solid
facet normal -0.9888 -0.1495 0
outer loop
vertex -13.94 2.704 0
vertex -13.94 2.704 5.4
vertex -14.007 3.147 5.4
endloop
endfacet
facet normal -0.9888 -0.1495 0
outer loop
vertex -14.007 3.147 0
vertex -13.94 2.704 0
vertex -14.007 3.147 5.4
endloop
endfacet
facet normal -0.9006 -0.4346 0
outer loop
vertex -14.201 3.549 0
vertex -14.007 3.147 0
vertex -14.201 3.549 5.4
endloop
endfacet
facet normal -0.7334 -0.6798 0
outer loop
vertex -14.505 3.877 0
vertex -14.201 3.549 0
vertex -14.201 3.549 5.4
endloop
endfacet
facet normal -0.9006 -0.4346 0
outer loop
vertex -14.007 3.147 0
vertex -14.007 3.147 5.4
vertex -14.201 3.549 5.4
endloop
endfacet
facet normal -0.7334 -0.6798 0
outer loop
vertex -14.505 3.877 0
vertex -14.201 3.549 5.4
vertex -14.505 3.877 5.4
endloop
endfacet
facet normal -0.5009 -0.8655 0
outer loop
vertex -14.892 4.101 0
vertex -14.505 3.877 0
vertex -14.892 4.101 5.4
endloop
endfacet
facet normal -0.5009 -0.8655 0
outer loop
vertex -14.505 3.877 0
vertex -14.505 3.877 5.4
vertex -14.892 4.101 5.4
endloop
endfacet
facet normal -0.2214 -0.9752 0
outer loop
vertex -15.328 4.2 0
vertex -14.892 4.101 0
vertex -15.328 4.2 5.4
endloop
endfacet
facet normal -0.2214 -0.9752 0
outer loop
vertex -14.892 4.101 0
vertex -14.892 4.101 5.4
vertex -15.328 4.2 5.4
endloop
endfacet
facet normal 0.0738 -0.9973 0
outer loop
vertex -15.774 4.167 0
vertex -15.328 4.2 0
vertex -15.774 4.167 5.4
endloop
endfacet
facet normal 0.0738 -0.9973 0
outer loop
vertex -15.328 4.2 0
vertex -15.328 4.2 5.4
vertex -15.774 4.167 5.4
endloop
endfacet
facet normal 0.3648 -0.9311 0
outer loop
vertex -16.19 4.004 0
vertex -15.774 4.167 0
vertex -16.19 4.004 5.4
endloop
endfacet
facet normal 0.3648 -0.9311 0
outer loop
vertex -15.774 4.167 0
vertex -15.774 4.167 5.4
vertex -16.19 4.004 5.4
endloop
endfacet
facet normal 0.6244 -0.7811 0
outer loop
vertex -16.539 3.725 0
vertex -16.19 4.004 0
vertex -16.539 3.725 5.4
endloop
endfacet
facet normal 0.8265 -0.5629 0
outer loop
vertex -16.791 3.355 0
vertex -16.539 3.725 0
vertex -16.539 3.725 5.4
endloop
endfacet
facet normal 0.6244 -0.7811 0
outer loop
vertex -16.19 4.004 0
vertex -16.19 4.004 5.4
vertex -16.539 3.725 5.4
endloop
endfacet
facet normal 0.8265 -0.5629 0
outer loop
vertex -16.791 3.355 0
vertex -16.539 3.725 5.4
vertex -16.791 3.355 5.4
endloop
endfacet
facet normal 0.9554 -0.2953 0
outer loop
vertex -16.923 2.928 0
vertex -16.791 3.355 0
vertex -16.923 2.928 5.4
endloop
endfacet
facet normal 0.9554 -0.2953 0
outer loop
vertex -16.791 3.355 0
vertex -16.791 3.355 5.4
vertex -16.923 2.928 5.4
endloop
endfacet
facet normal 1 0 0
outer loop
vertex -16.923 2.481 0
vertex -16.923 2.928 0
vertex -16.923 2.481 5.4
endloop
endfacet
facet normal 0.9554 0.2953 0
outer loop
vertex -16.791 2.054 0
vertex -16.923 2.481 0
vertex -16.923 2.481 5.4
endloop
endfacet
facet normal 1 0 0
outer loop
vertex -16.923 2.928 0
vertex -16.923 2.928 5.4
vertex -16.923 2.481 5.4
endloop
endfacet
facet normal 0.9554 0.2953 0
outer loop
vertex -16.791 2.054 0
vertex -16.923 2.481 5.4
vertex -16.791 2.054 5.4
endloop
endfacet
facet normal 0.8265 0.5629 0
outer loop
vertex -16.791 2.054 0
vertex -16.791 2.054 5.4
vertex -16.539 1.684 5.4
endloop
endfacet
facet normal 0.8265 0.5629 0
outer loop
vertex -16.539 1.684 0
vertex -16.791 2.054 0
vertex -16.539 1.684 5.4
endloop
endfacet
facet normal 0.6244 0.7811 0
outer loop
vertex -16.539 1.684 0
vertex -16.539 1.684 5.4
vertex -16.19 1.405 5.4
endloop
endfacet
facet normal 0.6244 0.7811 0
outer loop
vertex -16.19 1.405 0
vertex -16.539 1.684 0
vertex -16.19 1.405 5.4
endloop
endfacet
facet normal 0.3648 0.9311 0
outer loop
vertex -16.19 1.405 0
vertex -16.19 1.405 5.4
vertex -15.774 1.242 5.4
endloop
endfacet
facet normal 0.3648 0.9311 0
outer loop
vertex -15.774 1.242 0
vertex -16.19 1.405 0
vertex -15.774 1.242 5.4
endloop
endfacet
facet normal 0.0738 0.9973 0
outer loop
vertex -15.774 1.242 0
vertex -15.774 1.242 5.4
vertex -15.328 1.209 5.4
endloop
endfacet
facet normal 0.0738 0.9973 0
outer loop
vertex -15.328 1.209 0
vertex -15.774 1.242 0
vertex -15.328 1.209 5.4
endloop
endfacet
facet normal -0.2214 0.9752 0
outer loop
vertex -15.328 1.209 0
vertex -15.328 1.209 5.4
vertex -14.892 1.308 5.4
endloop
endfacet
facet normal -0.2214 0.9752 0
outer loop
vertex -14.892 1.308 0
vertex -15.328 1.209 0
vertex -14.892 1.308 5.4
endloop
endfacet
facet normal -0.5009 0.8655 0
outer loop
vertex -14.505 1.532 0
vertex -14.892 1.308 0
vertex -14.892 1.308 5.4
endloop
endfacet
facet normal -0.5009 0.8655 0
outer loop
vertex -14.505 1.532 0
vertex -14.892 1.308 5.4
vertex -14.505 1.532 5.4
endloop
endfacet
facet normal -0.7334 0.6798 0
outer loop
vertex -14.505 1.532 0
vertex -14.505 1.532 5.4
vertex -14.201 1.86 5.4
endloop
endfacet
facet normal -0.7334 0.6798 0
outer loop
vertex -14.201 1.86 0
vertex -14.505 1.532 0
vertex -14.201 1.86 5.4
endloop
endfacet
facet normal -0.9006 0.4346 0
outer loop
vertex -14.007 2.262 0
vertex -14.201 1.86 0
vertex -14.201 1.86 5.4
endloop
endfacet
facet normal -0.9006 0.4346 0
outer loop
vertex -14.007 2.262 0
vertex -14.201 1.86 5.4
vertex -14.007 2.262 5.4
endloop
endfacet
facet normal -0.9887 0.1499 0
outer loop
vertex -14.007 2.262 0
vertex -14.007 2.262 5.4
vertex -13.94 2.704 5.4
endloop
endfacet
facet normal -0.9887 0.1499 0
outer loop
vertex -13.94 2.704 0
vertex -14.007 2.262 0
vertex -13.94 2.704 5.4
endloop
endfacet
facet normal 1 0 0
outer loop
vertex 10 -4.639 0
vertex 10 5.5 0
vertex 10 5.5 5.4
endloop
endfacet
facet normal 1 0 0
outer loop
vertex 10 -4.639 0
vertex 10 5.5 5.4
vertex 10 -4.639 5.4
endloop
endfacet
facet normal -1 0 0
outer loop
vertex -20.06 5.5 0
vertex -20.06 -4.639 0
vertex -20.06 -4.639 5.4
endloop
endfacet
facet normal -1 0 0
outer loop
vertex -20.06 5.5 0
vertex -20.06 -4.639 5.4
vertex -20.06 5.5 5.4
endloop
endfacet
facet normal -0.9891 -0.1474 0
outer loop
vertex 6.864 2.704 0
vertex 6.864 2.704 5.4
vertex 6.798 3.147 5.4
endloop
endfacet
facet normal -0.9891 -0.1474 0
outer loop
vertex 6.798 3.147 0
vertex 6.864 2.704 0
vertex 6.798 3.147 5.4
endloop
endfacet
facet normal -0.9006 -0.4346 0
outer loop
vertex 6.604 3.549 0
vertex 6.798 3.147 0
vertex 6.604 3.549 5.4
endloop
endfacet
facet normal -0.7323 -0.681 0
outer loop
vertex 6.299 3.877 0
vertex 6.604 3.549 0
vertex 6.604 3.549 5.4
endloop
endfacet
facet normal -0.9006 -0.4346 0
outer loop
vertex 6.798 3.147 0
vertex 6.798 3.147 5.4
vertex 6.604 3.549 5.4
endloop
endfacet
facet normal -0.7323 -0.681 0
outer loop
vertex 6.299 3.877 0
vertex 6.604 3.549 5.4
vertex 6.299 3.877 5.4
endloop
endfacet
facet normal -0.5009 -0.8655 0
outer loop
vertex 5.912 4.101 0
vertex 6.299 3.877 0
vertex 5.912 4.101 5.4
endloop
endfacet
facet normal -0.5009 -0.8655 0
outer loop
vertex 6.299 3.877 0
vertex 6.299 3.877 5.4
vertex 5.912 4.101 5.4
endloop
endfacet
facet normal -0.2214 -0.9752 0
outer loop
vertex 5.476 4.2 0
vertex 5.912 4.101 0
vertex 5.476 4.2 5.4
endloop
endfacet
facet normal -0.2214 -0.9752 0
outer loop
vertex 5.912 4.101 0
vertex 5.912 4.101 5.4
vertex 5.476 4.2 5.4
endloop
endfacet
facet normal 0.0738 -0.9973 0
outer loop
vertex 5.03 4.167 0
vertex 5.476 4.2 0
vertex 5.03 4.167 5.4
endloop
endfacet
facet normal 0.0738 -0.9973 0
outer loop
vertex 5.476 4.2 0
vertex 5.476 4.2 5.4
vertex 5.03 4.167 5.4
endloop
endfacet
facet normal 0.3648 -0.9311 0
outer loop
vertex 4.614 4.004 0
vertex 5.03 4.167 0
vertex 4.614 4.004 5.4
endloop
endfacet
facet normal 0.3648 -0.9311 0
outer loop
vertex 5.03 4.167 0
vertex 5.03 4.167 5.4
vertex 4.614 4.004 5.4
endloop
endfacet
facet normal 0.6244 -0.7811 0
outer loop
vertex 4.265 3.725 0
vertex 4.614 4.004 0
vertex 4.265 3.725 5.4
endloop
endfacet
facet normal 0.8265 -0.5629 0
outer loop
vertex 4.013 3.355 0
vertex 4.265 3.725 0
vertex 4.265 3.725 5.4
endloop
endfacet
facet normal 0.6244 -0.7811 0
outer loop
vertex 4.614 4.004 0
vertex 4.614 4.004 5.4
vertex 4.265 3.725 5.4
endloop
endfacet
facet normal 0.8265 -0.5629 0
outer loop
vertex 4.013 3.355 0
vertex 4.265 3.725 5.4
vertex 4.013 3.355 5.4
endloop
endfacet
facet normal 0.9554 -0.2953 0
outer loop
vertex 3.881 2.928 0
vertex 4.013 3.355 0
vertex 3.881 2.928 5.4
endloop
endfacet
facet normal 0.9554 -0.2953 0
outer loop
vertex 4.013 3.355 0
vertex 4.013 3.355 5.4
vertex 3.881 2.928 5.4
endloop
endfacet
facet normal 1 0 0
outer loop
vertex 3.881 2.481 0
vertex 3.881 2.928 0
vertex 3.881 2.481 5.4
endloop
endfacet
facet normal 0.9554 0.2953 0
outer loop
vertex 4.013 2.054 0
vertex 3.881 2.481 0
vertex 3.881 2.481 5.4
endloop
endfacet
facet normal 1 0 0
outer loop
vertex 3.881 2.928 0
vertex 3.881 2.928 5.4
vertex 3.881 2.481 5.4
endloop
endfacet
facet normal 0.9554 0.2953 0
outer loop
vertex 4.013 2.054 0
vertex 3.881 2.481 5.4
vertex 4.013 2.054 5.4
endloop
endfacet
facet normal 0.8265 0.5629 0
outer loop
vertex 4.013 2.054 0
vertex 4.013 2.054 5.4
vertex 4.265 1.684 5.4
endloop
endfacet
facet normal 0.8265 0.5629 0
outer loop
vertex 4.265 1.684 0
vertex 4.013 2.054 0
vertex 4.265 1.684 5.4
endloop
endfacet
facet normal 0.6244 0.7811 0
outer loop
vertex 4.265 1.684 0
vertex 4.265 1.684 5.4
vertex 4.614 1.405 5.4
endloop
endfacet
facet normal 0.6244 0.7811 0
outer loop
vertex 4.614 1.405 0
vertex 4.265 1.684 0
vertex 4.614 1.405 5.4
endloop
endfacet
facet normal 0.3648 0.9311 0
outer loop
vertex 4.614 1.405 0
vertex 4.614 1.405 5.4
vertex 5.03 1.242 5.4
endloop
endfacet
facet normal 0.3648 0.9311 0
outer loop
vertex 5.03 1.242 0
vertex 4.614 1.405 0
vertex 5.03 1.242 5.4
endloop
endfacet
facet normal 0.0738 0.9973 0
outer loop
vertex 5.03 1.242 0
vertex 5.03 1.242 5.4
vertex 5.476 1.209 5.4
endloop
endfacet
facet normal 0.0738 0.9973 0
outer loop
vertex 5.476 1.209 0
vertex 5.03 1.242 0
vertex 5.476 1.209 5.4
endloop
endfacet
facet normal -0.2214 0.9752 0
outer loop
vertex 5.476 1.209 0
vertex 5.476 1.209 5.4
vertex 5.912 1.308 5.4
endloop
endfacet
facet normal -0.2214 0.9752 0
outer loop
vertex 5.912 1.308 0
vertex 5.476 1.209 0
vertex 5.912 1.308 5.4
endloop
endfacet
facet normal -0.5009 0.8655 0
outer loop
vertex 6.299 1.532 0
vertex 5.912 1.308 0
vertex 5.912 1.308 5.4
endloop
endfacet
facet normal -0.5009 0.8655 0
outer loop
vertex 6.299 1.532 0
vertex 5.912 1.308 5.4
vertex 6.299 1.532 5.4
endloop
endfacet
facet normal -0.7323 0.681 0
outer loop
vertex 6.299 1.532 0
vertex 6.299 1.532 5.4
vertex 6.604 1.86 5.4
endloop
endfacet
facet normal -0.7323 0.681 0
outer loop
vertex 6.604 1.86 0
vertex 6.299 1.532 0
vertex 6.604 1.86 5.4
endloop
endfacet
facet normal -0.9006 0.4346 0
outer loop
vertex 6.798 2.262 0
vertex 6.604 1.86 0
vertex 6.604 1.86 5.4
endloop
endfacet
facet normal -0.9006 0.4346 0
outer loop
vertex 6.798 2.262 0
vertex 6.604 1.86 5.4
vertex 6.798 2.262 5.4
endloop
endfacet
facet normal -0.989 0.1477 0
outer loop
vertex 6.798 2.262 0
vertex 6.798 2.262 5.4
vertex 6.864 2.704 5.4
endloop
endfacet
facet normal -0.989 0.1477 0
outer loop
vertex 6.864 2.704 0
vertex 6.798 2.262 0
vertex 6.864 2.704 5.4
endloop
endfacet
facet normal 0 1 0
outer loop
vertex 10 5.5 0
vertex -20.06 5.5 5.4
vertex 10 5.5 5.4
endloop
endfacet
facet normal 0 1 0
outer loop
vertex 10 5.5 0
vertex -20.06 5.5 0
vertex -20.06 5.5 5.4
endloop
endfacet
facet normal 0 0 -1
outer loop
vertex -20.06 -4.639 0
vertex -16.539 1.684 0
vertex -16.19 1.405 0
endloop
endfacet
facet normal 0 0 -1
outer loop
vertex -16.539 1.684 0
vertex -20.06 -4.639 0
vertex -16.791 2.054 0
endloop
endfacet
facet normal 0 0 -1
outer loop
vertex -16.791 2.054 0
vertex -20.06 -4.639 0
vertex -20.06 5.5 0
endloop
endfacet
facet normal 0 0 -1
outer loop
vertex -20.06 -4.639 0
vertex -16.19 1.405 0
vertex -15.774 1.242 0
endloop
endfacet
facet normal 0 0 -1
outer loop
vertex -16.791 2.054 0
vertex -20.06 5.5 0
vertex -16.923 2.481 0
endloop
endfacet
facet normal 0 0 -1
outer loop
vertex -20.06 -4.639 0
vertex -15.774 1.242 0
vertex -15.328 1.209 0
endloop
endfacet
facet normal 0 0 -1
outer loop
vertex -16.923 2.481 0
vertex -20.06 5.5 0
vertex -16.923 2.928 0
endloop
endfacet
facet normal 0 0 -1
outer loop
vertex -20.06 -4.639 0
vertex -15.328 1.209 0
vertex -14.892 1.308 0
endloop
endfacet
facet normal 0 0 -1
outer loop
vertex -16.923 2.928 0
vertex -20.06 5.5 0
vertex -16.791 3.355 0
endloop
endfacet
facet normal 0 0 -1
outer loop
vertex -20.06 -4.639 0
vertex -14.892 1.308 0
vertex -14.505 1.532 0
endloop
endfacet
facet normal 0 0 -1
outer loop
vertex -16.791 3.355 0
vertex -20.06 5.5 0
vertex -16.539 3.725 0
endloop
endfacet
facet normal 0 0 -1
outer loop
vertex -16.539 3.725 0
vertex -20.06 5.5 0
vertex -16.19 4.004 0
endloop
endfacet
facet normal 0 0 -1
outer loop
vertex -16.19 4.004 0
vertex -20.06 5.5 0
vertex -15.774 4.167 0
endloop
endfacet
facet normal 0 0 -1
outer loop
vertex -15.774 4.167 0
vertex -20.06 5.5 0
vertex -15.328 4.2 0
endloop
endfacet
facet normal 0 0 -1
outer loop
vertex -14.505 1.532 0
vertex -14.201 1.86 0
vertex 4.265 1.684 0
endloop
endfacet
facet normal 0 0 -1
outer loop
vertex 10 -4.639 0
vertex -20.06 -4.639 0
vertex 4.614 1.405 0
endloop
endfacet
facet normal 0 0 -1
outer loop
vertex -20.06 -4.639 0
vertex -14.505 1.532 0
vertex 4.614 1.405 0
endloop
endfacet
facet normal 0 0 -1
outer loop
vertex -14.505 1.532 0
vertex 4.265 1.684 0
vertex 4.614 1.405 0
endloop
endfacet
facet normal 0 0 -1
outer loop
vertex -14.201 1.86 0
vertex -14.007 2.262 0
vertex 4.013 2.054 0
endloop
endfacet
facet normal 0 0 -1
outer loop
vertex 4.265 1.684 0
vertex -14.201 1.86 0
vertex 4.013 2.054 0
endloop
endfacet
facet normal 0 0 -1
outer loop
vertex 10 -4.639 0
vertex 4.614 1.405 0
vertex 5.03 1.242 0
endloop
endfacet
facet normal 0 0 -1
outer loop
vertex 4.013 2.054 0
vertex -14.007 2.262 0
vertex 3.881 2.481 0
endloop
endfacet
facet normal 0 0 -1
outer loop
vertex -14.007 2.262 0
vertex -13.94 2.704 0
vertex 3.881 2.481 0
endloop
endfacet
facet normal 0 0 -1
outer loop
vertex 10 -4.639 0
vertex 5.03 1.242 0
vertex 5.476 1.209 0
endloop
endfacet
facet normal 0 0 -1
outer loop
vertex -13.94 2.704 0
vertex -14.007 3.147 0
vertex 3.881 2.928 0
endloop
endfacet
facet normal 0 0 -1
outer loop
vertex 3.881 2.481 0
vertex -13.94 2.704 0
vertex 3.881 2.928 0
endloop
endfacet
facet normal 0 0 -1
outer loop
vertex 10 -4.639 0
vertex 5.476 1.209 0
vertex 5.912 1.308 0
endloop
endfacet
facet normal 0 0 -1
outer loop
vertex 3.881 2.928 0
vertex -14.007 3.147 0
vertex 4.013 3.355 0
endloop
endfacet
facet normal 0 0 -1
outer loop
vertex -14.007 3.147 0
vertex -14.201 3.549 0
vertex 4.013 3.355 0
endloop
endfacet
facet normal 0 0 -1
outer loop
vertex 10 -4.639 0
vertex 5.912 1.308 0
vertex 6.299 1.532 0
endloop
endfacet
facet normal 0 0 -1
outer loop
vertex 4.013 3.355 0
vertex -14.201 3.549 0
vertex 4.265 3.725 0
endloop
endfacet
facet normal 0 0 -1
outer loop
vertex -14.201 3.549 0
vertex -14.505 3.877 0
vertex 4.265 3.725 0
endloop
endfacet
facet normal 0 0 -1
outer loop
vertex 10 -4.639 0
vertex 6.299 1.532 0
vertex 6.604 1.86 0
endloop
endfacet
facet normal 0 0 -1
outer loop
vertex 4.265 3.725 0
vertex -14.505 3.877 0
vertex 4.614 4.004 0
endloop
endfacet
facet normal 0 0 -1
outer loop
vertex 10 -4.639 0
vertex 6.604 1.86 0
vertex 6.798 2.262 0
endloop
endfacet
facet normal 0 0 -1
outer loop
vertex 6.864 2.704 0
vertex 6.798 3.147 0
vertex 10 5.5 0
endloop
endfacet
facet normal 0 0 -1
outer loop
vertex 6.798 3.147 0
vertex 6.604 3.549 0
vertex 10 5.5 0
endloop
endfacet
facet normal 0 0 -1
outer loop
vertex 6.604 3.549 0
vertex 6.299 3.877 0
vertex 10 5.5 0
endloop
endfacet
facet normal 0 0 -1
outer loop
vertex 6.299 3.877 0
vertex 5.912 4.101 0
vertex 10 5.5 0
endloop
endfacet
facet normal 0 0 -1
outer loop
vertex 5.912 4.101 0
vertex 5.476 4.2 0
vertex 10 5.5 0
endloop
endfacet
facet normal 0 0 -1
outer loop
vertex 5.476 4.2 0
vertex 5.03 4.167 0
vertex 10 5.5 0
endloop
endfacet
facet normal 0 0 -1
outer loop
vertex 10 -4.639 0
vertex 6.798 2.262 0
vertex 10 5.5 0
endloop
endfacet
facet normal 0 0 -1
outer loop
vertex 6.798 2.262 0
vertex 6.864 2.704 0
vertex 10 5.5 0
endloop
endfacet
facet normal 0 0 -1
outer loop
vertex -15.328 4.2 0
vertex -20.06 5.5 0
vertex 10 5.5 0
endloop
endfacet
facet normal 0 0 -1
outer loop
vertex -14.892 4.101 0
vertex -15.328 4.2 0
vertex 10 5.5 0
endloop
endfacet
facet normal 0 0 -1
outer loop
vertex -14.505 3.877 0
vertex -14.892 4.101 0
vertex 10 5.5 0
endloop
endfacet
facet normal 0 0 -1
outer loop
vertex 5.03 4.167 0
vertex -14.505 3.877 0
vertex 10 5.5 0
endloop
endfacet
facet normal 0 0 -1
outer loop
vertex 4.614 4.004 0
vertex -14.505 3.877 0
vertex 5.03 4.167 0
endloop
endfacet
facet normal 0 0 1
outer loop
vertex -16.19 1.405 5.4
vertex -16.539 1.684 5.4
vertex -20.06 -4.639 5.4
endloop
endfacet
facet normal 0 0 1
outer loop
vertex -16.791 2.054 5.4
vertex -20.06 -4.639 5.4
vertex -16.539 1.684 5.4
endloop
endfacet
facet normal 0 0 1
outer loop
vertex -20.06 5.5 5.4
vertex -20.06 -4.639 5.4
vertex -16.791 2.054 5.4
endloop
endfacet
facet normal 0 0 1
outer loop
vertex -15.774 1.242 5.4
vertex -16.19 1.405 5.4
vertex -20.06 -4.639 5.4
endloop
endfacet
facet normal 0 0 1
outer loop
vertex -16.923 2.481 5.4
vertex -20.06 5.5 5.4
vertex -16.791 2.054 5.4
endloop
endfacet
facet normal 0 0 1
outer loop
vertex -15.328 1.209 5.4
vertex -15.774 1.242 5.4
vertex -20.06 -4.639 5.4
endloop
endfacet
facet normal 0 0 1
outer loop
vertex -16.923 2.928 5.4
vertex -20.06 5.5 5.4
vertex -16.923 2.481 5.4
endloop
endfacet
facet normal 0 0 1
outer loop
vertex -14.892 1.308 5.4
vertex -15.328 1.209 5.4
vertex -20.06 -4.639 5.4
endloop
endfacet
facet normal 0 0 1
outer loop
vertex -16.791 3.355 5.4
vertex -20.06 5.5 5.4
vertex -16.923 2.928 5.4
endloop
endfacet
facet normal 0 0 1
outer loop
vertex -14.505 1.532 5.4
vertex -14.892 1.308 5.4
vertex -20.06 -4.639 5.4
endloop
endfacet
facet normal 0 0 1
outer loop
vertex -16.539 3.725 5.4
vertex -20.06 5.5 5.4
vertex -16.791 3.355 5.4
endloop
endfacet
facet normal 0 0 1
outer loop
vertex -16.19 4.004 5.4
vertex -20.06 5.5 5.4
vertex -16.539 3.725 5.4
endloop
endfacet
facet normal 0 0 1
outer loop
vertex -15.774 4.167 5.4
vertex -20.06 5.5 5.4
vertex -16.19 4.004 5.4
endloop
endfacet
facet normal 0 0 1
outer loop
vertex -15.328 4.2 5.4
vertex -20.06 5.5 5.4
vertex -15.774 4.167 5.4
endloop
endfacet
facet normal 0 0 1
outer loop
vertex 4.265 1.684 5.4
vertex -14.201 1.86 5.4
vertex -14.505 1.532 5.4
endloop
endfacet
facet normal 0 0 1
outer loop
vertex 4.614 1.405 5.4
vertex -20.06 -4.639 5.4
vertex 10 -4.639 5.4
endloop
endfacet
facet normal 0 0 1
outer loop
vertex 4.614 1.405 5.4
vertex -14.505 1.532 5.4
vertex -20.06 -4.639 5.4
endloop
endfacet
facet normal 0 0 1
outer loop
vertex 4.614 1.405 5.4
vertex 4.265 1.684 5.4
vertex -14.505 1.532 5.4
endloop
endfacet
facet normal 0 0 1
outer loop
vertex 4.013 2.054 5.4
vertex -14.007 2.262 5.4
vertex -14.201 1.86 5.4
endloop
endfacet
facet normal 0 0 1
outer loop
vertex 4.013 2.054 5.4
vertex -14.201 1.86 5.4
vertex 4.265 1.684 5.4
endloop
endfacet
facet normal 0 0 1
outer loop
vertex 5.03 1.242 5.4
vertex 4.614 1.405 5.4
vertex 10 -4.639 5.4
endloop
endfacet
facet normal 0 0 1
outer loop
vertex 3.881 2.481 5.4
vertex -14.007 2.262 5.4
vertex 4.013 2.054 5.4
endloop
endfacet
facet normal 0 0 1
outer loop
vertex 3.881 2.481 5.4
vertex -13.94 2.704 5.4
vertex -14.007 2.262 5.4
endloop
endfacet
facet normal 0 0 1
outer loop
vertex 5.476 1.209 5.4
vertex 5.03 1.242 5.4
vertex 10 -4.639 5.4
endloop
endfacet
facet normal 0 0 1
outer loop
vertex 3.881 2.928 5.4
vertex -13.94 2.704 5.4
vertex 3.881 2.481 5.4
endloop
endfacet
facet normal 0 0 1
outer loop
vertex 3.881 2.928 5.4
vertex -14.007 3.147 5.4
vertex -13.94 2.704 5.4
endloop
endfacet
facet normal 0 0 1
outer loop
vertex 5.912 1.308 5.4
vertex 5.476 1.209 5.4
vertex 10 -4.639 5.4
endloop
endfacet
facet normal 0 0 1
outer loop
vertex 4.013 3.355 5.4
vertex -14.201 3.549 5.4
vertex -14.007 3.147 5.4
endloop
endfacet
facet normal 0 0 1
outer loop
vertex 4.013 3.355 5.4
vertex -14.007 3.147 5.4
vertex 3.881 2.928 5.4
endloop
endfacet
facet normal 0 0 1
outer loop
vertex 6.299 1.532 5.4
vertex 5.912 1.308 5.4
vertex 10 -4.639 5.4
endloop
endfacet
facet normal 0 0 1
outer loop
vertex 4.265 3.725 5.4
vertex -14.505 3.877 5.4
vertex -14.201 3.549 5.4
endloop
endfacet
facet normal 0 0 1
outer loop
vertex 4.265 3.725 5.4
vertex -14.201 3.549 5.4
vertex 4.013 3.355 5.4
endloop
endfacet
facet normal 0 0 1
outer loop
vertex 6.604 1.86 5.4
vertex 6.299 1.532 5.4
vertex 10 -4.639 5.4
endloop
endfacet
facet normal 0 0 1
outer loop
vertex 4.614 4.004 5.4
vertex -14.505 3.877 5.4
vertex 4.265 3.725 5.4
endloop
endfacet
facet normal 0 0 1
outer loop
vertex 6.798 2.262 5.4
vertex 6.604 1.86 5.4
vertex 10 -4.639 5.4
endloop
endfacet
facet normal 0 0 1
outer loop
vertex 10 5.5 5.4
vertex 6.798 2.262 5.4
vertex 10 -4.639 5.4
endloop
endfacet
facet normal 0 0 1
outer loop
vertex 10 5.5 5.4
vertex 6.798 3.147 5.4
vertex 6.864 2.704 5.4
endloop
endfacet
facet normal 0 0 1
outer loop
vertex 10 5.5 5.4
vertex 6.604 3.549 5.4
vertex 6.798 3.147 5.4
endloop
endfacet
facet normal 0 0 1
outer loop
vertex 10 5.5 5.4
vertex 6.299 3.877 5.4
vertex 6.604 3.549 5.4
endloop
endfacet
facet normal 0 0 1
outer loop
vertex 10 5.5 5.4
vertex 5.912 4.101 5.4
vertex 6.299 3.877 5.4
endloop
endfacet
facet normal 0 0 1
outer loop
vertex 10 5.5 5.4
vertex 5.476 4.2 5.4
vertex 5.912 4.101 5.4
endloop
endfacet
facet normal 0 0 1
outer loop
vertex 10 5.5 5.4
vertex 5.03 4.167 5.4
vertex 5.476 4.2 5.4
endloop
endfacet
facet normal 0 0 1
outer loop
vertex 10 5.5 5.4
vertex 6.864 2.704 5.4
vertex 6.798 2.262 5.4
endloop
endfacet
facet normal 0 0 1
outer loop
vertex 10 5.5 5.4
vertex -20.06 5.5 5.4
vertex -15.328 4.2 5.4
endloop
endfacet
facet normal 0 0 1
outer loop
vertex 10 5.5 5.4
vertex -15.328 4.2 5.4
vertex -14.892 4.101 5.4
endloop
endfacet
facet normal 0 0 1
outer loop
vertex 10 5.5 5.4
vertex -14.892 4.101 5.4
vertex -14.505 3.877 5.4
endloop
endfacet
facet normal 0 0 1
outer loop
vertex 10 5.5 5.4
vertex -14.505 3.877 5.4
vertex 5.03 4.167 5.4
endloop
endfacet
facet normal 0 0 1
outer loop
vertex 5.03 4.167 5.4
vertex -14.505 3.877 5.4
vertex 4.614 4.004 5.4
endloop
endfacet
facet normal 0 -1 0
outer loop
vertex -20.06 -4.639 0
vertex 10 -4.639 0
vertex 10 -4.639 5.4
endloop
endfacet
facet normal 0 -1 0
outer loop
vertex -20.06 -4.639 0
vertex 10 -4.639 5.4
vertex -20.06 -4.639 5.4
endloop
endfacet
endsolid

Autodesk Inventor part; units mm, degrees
ref_plane "YZ Plane" through (0, 0, 0) normal (1, 0, 0) x (0, 1, 0)
ref_plane "XZ Plane" through (0, 0, 0) normal (0, 1, 0) x (-1, 0, 0)
ref_plane "XY Plane" through (0, 0, 0) normal (0, 0, 1) x (1, 0, 0)
sketch "草图1" plane through (0, 0, 0) normal (0, 0, 1) x (1, 0, 0)
  line L0 (10, -4.6392) -> (-20.0603, -4.6392)
  line L1 (-20.0603, -4.6392) -> (-20.0603, 5.5)
  line L2 (-20.0603, 5.5) -> (10, 5.5)
  line L3 (10, 5.5) -> (10, -4.6392)
  point P0 (0, 0)
  dimension "d7" = 10.1392
extrude "拉伸1" add sketch "草图1" along normal blind 5.4
sketch "草图2" plane through (0, 0, 5.4) normal (0, 0, 1) x (1, 0, 0)
  circle A0 centre (5.3642, 2.7045) radius 1.5 projected
  circle A1 centre (-15.4399, 2.7045) radius 1.5 projected
extrude "拉伸2" cut sketch "草图2" against normal blind 21.65
properties part number "攻单夹片1"
